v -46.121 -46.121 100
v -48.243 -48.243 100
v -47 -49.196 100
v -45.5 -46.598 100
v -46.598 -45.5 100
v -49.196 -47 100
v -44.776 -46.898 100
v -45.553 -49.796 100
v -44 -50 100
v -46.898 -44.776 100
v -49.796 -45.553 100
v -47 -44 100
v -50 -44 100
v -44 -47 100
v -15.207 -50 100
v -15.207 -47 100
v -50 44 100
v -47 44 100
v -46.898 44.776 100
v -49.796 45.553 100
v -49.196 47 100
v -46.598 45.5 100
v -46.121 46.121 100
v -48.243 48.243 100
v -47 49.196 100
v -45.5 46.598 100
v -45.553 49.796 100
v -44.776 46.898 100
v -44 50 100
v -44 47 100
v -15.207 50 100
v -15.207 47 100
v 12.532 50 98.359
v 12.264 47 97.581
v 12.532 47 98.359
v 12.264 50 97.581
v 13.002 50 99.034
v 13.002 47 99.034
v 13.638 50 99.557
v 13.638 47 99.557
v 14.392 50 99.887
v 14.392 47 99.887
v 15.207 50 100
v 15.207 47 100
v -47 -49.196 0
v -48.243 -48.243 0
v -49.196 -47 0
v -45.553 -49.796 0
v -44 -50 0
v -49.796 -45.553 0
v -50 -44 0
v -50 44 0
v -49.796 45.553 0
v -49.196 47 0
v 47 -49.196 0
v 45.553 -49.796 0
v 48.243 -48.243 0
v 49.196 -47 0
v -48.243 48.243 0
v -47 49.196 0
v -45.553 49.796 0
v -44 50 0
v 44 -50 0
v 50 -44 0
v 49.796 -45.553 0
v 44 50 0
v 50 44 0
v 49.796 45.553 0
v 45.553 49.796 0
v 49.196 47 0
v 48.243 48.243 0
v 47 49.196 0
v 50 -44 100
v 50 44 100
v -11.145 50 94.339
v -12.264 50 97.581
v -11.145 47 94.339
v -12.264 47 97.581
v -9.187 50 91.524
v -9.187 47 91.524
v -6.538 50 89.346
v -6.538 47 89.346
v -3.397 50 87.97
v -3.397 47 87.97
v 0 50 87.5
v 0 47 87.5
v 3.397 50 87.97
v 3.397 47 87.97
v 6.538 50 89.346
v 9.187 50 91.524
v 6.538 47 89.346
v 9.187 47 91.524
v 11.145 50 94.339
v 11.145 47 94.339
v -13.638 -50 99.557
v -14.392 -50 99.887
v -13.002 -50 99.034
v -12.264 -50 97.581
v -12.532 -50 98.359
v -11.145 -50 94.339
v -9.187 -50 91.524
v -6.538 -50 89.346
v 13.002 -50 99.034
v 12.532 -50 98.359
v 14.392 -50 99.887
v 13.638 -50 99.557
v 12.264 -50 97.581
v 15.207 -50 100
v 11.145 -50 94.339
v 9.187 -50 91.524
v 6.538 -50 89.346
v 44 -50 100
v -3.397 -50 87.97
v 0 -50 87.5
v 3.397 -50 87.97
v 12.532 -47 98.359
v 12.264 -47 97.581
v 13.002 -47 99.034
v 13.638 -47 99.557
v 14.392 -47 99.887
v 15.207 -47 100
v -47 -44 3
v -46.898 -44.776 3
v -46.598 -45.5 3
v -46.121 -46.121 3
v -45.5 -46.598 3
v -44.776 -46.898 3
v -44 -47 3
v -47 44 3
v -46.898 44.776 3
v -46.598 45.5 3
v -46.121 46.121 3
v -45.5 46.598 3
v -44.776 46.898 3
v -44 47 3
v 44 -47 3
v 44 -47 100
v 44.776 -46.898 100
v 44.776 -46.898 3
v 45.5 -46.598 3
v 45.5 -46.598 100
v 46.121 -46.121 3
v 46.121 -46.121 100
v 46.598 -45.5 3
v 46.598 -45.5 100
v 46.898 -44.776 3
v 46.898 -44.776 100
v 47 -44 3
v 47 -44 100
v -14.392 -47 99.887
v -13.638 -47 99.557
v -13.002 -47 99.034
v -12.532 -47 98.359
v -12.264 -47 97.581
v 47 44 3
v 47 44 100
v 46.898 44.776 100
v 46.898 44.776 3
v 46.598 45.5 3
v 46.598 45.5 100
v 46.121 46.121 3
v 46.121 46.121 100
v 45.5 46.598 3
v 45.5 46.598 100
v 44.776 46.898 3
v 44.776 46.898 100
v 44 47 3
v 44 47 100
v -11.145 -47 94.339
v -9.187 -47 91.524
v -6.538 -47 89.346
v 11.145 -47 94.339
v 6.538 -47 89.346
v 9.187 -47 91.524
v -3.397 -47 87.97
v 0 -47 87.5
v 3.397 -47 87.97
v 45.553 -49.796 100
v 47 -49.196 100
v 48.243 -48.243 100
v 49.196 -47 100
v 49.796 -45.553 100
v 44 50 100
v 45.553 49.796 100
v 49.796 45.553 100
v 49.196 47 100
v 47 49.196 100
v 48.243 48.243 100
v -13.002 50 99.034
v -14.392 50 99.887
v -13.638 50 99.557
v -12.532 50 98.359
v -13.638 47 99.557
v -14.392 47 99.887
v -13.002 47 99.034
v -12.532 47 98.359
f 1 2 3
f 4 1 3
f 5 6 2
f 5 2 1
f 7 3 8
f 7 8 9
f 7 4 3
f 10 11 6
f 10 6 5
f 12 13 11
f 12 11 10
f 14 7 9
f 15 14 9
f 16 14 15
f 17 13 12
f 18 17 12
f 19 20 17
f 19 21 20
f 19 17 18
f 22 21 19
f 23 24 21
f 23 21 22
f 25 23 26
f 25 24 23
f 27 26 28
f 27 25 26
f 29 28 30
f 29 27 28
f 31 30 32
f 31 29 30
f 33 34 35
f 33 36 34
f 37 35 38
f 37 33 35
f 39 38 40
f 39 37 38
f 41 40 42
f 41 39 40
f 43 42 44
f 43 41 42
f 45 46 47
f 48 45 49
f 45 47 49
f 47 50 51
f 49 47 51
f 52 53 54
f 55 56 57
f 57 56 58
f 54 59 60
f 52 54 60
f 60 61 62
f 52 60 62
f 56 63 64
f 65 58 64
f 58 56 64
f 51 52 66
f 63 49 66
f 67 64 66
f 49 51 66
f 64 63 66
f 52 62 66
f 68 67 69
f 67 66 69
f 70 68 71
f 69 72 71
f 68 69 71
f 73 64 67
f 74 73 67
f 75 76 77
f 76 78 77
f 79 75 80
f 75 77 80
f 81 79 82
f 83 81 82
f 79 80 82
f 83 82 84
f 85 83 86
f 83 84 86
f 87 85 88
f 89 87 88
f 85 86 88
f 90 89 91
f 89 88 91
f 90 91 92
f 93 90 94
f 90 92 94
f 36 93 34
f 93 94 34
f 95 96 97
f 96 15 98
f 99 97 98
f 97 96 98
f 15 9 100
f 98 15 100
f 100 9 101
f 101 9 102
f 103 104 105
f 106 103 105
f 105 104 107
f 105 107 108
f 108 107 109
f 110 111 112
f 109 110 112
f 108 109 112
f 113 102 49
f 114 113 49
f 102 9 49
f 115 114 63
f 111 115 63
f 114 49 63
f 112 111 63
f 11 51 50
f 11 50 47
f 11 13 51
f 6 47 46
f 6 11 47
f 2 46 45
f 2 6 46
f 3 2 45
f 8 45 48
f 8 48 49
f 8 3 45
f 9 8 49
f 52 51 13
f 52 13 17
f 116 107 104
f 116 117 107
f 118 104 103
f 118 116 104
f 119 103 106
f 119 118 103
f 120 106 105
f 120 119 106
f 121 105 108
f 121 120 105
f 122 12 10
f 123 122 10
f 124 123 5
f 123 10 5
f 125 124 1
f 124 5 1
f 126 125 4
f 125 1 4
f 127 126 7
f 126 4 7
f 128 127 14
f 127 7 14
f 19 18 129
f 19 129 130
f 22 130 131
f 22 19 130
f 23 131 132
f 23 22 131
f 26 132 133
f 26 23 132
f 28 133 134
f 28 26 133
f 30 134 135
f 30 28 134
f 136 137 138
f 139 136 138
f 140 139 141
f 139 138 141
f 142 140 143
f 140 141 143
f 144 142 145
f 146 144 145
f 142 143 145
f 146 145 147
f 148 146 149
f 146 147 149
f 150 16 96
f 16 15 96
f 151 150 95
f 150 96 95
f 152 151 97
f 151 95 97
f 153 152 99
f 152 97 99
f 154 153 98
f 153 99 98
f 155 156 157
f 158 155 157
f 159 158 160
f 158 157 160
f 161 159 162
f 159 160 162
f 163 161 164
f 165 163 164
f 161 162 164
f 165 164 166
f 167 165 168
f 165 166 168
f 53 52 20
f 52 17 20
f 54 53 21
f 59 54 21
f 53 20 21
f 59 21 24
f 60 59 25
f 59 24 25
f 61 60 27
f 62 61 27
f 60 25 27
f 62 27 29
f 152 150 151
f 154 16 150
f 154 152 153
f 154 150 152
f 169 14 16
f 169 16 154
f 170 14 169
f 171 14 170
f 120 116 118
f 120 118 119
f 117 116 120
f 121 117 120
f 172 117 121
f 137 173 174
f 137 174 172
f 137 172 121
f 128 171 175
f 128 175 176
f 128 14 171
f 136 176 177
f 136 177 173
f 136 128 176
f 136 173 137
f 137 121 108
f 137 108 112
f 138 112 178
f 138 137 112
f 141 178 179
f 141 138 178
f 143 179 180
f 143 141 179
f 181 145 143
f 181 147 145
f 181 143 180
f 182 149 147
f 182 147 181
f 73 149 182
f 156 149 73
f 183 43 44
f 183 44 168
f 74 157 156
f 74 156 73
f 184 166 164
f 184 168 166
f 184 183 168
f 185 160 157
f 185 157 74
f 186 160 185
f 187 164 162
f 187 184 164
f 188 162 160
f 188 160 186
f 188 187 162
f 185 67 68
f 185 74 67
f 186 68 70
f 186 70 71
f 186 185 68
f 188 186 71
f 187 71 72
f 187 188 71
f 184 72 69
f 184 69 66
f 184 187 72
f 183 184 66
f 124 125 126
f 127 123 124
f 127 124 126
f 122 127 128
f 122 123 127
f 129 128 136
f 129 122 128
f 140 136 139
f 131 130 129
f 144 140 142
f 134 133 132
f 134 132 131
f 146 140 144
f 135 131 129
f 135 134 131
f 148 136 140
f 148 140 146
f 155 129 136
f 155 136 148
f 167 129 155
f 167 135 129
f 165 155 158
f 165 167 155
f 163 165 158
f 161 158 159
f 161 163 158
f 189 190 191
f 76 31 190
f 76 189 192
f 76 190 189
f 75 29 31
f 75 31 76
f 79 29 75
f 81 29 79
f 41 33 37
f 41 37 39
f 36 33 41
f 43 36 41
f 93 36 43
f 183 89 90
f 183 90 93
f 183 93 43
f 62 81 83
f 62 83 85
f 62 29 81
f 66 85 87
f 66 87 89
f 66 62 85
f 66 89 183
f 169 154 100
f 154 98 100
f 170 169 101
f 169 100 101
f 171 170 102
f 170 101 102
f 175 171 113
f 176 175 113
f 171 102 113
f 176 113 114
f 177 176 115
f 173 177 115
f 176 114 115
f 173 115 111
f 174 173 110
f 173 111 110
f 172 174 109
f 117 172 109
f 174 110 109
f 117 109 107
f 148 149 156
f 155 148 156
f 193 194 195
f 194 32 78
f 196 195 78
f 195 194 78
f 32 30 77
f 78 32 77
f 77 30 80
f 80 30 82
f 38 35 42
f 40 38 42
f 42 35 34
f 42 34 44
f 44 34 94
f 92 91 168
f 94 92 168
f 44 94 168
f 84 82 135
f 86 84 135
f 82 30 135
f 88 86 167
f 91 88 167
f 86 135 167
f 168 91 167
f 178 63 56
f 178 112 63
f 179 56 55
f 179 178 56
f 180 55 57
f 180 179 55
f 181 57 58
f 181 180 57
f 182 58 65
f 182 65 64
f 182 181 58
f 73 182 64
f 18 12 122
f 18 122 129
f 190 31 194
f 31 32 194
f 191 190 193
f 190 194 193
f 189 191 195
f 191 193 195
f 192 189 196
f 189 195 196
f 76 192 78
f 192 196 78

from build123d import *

# Parameters (mm, degrees)
F0_W     = 100
F0_H     = 100
F1_DEPTH = 100
F2_R     = 6
F3_T     = -3
F4_R     = 12.5
F5_DEPTH = 100.001
F6_R     = 3


with BuildPart() as f1:
    # F0 (on Top) → F1 (new body)
    with BuildSketch(Plane.XY):
        Rectangle(F0_W, F0_H)
    extrude(amount=F1_DEPTH)

    # F2
    f2_edges = [f1.edges().sort_by_distance(p)[0] for p in [
        (50, -50, 50),
        (-50, -50, 50),
        (50, 50, 50),
        (-50, 50, 50),
    ]]
    fillet(f2_edges, radius=F2_R)

    # F3
    f3_openings = [f1.faces().sort_by_distance(p)[0] for p in [
        (0, 0, 100),
    ]]
    offset(amount=F3_T, openings=f3_openings)

    # F4 (on face) → F5 (cut, through all)
    with BuildSketch(Plane.XZ.offset(50)):
        with Locations((0, 100)):
            Circle(F4_R)
    extrude(amount=-F5_DEPTH, mode=Mode.SUBTRACT)

    # F6
    f6_edges = [f1.edges().sort_by_distance(p)[0] for p in [
        (-12.5, 48.5, 100),
        (-12.5, -48.5, 100),
        (12.5, -48.5, 100),
        (12.5, 48.5, 100),
    ]]
    fillet(f6_edges, radius=F6_R)


solid = f1.part
